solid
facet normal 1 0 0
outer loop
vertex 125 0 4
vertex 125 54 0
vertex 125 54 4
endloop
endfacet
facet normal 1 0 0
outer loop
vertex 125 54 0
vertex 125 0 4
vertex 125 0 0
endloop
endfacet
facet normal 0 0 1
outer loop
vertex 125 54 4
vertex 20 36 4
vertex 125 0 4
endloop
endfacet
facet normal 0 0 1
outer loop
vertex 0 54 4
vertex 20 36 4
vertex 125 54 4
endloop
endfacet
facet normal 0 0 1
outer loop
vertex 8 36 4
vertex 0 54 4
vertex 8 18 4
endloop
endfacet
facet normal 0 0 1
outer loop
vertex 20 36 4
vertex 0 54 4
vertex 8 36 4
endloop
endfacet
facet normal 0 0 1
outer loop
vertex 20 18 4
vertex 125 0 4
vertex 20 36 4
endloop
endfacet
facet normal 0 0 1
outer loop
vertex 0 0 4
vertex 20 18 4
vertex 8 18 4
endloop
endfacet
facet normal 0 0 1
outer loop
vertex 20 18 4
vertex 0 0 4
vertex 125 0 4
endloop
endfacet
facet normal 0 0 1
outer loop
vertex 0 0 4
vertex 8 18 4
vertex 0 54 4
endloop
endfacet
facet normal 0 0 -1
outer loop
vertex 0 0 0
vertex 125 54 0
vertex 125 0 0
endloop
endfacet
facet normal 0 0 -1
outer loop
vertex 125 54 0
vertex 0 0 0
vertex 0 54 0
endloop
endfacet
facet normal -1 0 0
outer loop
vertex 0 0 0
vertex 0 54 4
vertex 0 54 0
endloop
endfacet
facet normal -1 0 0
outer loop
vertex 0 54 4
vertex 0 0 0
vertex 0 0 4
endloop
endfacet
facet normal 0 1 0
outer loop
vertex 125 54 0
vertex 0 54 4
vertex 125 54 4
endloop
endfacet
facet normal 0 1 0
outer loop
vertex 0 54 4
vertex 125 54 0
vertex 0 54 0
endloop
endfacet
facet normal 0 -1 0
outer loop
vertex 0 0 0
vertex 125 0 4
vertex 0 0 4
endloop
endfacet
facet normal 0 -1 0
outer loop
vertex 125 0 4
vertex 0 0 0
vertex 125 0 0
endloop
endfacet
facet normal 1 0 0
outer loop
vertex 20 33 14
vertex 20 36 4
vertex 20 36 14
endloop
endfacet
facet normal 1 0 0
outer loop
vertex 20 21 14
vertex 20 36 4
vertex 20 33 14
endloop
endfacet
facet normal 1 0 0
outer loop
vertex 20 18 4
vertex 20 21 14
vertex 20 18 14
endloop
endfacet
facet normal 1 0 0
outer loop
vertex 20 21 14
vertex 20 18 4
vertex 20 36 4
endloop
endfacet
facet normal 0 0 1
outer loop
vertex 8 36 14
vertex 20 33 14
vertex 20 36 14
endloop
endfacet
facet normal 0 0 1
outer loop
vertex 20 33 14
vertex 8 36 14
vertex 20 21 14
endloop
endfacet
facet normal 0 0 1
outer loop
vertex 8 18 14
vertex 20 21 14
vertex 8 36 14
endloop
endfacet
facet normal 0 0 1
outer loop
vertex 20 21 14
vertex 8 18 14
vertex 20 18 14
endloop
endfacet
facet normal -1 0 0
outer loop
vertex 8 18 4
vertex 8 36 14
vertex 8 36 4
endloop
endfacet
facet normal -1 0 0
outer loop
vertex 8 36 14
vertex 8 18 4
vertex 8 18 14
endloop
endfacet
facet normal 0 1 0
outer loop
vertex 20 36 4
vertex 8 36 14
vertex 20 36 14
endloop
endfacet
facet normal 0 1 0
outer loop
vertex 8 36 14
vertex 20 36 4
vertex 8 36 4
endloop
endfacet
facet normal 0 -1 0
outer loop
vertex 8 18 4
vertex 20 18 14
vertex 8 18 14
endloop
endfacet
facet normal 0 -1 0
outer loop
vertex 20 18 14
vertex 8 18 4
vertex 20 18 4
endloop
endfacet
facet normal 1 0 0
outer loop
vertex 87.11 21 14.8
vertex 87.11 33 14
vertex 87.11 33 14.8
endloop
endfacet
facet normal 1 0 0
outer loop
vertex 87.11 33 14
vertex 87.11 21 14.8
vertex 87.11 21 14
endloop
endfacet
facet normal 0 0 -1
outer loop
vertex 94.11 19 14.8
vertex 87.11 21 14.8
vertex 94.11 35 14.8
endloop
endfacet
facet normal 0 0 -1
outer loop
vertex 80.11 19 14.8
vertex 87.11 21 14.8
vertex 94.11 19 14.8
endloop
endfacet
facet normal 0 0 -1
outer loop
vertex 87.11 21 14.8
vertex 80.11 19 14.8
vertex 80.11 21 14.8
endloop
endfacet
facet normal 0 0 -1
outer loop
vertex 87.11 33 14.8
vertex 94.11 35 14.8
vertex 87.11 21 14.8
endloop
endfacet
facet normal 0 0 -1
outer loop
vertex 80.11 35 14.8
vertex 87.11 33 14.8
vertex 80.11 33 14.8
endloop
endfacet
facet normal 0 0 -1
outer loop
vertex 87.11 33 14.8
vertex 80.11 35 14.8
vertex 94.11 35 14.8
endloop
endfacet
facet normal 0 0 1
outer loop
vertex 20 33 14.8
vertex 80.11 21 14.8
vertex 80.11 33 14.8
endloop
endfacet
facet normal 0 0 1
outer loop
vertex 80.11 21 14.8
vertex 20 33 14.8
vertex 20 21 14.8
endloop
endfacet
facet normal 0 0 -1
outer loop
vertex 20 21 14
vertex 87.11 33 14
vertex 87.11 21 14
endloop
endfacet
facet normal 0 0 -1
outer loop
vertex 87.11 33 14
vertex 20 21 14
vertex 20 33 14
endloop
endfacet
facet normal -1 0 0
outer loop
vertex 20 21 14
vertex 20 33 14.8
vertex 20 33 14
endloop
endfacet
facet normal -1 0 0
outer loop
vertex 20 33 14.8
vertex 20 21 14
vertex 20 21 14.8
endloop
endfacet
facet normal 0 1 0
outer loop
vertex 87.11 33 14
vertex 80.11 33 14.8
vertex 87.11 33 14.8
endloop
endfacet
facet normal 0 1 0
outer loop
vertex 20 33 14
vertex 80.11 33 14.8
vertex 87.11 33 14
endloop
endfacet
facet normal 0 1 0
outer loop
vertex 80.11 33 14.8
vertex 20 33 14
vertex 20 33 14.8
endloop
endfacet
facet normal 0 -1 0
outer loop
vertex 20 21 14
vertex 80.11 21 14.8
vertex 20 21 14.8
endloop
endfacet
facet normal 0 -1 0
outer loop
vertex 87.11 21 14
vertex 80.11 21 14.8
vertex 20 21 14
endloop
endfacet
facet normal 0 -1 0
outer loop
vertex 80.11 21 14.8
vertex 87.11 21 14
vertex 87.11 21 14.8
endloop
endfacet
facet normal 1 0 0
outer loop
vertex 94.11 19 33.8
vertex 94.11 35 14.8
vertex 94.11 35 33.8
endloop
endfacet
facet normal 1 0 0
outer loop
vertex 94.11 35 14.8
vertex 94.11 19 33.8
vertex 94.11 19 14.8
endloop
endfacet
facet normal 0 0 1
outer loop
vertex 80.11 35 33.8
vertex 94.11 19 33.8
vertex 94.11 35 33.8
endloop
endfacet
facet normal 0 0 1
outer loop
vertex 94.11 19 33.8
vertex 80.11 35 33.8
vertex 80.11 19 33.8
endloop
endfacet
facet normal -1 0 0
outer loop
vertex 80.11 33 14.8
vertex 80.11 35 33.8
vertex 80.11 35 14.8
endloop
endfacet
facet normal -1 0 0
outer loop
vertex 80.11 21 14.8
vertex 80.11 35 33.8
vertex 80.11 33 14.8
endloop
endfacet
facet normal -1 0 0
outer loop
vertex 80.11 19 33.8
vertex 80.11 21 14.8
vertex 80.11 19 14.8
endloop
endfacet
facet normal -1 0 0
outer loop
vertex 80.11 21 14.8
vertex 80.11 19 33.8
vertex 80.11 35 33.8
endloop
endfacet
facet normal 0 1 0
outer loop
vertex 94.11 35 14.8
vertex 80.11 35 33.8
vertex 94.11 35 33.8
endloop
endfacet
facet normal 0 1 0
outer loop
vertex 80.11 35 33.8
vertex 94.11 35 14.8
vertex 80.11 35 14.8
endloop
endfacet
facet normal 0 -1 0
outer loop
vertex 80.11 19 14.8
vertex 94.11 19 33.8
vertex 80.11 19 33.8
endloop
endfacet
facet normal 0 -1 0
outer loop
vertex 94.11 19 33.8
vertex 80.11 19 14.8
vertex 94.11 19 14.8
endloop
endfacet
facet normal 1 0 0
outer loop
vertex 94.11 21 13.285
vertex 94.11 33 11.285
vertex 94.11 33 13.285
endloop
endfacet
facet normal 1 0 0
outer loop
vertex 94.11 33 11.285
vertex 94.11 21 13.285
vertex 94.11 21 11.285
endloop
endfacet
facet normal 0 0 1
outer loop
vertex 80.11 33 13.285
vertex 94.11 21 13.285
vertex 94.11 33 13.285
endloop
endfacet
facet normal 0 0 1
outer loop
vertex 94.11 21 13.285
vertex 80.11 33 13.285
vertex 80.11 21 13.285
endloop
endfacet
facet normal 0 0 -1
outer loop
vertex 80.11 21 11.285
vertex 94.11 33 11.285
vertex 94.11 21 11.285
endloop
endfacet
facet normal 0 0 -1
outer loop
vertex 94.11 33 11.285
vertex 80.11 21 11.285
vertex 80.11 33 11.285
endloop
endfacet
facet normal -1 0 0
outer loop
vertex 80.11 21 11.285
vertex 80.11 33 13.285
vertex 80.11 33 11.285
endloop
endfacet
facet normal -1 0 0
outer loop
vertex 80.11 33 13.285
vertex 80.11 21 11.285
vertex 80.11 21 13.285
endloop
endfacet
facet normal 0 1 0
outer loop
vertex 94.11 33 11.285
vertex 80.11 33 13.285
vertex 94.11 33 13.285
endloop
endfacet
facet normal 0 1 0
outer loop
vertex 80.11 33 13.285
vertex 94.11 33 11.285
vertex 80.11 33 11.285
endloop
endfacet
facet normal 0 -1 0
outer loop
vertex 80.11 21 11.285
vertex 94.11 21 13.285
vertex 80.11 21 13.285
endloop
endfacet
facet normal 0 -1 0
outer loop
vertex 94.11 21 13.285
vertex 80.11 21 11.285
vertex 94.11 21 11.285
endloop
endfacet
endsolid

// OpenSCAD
// REI Resonance Memory: editable single-channel envelope, NOT FOR FABRICATION.
// Units: mm. No validated fastener, holder, latch or enclosure design.
length=67.11; width=12; thickness=0.8; gap=0.715;
base=[125,54,4];
$fn=48;
color("dimgray") cube(base);
color("silver") translate([8,18,4]) cube([12,18,10]);
color("silver") translate([20,21,14]) cube([length,width,thickness]);
// Nominal mass volume shown only as an envelope; actual weight includes hardware.
color("goldenrod") translate([20+length-7,19,14.8]) cube([14,16,19]);
color("steelblue") translate([20+length-7,21,14-gap-2]) cube([14,12,2]);
// Transparent enclosure outline. No claim of containment capacity.
%translate([2,2,4]) cube([121,50,34]);
